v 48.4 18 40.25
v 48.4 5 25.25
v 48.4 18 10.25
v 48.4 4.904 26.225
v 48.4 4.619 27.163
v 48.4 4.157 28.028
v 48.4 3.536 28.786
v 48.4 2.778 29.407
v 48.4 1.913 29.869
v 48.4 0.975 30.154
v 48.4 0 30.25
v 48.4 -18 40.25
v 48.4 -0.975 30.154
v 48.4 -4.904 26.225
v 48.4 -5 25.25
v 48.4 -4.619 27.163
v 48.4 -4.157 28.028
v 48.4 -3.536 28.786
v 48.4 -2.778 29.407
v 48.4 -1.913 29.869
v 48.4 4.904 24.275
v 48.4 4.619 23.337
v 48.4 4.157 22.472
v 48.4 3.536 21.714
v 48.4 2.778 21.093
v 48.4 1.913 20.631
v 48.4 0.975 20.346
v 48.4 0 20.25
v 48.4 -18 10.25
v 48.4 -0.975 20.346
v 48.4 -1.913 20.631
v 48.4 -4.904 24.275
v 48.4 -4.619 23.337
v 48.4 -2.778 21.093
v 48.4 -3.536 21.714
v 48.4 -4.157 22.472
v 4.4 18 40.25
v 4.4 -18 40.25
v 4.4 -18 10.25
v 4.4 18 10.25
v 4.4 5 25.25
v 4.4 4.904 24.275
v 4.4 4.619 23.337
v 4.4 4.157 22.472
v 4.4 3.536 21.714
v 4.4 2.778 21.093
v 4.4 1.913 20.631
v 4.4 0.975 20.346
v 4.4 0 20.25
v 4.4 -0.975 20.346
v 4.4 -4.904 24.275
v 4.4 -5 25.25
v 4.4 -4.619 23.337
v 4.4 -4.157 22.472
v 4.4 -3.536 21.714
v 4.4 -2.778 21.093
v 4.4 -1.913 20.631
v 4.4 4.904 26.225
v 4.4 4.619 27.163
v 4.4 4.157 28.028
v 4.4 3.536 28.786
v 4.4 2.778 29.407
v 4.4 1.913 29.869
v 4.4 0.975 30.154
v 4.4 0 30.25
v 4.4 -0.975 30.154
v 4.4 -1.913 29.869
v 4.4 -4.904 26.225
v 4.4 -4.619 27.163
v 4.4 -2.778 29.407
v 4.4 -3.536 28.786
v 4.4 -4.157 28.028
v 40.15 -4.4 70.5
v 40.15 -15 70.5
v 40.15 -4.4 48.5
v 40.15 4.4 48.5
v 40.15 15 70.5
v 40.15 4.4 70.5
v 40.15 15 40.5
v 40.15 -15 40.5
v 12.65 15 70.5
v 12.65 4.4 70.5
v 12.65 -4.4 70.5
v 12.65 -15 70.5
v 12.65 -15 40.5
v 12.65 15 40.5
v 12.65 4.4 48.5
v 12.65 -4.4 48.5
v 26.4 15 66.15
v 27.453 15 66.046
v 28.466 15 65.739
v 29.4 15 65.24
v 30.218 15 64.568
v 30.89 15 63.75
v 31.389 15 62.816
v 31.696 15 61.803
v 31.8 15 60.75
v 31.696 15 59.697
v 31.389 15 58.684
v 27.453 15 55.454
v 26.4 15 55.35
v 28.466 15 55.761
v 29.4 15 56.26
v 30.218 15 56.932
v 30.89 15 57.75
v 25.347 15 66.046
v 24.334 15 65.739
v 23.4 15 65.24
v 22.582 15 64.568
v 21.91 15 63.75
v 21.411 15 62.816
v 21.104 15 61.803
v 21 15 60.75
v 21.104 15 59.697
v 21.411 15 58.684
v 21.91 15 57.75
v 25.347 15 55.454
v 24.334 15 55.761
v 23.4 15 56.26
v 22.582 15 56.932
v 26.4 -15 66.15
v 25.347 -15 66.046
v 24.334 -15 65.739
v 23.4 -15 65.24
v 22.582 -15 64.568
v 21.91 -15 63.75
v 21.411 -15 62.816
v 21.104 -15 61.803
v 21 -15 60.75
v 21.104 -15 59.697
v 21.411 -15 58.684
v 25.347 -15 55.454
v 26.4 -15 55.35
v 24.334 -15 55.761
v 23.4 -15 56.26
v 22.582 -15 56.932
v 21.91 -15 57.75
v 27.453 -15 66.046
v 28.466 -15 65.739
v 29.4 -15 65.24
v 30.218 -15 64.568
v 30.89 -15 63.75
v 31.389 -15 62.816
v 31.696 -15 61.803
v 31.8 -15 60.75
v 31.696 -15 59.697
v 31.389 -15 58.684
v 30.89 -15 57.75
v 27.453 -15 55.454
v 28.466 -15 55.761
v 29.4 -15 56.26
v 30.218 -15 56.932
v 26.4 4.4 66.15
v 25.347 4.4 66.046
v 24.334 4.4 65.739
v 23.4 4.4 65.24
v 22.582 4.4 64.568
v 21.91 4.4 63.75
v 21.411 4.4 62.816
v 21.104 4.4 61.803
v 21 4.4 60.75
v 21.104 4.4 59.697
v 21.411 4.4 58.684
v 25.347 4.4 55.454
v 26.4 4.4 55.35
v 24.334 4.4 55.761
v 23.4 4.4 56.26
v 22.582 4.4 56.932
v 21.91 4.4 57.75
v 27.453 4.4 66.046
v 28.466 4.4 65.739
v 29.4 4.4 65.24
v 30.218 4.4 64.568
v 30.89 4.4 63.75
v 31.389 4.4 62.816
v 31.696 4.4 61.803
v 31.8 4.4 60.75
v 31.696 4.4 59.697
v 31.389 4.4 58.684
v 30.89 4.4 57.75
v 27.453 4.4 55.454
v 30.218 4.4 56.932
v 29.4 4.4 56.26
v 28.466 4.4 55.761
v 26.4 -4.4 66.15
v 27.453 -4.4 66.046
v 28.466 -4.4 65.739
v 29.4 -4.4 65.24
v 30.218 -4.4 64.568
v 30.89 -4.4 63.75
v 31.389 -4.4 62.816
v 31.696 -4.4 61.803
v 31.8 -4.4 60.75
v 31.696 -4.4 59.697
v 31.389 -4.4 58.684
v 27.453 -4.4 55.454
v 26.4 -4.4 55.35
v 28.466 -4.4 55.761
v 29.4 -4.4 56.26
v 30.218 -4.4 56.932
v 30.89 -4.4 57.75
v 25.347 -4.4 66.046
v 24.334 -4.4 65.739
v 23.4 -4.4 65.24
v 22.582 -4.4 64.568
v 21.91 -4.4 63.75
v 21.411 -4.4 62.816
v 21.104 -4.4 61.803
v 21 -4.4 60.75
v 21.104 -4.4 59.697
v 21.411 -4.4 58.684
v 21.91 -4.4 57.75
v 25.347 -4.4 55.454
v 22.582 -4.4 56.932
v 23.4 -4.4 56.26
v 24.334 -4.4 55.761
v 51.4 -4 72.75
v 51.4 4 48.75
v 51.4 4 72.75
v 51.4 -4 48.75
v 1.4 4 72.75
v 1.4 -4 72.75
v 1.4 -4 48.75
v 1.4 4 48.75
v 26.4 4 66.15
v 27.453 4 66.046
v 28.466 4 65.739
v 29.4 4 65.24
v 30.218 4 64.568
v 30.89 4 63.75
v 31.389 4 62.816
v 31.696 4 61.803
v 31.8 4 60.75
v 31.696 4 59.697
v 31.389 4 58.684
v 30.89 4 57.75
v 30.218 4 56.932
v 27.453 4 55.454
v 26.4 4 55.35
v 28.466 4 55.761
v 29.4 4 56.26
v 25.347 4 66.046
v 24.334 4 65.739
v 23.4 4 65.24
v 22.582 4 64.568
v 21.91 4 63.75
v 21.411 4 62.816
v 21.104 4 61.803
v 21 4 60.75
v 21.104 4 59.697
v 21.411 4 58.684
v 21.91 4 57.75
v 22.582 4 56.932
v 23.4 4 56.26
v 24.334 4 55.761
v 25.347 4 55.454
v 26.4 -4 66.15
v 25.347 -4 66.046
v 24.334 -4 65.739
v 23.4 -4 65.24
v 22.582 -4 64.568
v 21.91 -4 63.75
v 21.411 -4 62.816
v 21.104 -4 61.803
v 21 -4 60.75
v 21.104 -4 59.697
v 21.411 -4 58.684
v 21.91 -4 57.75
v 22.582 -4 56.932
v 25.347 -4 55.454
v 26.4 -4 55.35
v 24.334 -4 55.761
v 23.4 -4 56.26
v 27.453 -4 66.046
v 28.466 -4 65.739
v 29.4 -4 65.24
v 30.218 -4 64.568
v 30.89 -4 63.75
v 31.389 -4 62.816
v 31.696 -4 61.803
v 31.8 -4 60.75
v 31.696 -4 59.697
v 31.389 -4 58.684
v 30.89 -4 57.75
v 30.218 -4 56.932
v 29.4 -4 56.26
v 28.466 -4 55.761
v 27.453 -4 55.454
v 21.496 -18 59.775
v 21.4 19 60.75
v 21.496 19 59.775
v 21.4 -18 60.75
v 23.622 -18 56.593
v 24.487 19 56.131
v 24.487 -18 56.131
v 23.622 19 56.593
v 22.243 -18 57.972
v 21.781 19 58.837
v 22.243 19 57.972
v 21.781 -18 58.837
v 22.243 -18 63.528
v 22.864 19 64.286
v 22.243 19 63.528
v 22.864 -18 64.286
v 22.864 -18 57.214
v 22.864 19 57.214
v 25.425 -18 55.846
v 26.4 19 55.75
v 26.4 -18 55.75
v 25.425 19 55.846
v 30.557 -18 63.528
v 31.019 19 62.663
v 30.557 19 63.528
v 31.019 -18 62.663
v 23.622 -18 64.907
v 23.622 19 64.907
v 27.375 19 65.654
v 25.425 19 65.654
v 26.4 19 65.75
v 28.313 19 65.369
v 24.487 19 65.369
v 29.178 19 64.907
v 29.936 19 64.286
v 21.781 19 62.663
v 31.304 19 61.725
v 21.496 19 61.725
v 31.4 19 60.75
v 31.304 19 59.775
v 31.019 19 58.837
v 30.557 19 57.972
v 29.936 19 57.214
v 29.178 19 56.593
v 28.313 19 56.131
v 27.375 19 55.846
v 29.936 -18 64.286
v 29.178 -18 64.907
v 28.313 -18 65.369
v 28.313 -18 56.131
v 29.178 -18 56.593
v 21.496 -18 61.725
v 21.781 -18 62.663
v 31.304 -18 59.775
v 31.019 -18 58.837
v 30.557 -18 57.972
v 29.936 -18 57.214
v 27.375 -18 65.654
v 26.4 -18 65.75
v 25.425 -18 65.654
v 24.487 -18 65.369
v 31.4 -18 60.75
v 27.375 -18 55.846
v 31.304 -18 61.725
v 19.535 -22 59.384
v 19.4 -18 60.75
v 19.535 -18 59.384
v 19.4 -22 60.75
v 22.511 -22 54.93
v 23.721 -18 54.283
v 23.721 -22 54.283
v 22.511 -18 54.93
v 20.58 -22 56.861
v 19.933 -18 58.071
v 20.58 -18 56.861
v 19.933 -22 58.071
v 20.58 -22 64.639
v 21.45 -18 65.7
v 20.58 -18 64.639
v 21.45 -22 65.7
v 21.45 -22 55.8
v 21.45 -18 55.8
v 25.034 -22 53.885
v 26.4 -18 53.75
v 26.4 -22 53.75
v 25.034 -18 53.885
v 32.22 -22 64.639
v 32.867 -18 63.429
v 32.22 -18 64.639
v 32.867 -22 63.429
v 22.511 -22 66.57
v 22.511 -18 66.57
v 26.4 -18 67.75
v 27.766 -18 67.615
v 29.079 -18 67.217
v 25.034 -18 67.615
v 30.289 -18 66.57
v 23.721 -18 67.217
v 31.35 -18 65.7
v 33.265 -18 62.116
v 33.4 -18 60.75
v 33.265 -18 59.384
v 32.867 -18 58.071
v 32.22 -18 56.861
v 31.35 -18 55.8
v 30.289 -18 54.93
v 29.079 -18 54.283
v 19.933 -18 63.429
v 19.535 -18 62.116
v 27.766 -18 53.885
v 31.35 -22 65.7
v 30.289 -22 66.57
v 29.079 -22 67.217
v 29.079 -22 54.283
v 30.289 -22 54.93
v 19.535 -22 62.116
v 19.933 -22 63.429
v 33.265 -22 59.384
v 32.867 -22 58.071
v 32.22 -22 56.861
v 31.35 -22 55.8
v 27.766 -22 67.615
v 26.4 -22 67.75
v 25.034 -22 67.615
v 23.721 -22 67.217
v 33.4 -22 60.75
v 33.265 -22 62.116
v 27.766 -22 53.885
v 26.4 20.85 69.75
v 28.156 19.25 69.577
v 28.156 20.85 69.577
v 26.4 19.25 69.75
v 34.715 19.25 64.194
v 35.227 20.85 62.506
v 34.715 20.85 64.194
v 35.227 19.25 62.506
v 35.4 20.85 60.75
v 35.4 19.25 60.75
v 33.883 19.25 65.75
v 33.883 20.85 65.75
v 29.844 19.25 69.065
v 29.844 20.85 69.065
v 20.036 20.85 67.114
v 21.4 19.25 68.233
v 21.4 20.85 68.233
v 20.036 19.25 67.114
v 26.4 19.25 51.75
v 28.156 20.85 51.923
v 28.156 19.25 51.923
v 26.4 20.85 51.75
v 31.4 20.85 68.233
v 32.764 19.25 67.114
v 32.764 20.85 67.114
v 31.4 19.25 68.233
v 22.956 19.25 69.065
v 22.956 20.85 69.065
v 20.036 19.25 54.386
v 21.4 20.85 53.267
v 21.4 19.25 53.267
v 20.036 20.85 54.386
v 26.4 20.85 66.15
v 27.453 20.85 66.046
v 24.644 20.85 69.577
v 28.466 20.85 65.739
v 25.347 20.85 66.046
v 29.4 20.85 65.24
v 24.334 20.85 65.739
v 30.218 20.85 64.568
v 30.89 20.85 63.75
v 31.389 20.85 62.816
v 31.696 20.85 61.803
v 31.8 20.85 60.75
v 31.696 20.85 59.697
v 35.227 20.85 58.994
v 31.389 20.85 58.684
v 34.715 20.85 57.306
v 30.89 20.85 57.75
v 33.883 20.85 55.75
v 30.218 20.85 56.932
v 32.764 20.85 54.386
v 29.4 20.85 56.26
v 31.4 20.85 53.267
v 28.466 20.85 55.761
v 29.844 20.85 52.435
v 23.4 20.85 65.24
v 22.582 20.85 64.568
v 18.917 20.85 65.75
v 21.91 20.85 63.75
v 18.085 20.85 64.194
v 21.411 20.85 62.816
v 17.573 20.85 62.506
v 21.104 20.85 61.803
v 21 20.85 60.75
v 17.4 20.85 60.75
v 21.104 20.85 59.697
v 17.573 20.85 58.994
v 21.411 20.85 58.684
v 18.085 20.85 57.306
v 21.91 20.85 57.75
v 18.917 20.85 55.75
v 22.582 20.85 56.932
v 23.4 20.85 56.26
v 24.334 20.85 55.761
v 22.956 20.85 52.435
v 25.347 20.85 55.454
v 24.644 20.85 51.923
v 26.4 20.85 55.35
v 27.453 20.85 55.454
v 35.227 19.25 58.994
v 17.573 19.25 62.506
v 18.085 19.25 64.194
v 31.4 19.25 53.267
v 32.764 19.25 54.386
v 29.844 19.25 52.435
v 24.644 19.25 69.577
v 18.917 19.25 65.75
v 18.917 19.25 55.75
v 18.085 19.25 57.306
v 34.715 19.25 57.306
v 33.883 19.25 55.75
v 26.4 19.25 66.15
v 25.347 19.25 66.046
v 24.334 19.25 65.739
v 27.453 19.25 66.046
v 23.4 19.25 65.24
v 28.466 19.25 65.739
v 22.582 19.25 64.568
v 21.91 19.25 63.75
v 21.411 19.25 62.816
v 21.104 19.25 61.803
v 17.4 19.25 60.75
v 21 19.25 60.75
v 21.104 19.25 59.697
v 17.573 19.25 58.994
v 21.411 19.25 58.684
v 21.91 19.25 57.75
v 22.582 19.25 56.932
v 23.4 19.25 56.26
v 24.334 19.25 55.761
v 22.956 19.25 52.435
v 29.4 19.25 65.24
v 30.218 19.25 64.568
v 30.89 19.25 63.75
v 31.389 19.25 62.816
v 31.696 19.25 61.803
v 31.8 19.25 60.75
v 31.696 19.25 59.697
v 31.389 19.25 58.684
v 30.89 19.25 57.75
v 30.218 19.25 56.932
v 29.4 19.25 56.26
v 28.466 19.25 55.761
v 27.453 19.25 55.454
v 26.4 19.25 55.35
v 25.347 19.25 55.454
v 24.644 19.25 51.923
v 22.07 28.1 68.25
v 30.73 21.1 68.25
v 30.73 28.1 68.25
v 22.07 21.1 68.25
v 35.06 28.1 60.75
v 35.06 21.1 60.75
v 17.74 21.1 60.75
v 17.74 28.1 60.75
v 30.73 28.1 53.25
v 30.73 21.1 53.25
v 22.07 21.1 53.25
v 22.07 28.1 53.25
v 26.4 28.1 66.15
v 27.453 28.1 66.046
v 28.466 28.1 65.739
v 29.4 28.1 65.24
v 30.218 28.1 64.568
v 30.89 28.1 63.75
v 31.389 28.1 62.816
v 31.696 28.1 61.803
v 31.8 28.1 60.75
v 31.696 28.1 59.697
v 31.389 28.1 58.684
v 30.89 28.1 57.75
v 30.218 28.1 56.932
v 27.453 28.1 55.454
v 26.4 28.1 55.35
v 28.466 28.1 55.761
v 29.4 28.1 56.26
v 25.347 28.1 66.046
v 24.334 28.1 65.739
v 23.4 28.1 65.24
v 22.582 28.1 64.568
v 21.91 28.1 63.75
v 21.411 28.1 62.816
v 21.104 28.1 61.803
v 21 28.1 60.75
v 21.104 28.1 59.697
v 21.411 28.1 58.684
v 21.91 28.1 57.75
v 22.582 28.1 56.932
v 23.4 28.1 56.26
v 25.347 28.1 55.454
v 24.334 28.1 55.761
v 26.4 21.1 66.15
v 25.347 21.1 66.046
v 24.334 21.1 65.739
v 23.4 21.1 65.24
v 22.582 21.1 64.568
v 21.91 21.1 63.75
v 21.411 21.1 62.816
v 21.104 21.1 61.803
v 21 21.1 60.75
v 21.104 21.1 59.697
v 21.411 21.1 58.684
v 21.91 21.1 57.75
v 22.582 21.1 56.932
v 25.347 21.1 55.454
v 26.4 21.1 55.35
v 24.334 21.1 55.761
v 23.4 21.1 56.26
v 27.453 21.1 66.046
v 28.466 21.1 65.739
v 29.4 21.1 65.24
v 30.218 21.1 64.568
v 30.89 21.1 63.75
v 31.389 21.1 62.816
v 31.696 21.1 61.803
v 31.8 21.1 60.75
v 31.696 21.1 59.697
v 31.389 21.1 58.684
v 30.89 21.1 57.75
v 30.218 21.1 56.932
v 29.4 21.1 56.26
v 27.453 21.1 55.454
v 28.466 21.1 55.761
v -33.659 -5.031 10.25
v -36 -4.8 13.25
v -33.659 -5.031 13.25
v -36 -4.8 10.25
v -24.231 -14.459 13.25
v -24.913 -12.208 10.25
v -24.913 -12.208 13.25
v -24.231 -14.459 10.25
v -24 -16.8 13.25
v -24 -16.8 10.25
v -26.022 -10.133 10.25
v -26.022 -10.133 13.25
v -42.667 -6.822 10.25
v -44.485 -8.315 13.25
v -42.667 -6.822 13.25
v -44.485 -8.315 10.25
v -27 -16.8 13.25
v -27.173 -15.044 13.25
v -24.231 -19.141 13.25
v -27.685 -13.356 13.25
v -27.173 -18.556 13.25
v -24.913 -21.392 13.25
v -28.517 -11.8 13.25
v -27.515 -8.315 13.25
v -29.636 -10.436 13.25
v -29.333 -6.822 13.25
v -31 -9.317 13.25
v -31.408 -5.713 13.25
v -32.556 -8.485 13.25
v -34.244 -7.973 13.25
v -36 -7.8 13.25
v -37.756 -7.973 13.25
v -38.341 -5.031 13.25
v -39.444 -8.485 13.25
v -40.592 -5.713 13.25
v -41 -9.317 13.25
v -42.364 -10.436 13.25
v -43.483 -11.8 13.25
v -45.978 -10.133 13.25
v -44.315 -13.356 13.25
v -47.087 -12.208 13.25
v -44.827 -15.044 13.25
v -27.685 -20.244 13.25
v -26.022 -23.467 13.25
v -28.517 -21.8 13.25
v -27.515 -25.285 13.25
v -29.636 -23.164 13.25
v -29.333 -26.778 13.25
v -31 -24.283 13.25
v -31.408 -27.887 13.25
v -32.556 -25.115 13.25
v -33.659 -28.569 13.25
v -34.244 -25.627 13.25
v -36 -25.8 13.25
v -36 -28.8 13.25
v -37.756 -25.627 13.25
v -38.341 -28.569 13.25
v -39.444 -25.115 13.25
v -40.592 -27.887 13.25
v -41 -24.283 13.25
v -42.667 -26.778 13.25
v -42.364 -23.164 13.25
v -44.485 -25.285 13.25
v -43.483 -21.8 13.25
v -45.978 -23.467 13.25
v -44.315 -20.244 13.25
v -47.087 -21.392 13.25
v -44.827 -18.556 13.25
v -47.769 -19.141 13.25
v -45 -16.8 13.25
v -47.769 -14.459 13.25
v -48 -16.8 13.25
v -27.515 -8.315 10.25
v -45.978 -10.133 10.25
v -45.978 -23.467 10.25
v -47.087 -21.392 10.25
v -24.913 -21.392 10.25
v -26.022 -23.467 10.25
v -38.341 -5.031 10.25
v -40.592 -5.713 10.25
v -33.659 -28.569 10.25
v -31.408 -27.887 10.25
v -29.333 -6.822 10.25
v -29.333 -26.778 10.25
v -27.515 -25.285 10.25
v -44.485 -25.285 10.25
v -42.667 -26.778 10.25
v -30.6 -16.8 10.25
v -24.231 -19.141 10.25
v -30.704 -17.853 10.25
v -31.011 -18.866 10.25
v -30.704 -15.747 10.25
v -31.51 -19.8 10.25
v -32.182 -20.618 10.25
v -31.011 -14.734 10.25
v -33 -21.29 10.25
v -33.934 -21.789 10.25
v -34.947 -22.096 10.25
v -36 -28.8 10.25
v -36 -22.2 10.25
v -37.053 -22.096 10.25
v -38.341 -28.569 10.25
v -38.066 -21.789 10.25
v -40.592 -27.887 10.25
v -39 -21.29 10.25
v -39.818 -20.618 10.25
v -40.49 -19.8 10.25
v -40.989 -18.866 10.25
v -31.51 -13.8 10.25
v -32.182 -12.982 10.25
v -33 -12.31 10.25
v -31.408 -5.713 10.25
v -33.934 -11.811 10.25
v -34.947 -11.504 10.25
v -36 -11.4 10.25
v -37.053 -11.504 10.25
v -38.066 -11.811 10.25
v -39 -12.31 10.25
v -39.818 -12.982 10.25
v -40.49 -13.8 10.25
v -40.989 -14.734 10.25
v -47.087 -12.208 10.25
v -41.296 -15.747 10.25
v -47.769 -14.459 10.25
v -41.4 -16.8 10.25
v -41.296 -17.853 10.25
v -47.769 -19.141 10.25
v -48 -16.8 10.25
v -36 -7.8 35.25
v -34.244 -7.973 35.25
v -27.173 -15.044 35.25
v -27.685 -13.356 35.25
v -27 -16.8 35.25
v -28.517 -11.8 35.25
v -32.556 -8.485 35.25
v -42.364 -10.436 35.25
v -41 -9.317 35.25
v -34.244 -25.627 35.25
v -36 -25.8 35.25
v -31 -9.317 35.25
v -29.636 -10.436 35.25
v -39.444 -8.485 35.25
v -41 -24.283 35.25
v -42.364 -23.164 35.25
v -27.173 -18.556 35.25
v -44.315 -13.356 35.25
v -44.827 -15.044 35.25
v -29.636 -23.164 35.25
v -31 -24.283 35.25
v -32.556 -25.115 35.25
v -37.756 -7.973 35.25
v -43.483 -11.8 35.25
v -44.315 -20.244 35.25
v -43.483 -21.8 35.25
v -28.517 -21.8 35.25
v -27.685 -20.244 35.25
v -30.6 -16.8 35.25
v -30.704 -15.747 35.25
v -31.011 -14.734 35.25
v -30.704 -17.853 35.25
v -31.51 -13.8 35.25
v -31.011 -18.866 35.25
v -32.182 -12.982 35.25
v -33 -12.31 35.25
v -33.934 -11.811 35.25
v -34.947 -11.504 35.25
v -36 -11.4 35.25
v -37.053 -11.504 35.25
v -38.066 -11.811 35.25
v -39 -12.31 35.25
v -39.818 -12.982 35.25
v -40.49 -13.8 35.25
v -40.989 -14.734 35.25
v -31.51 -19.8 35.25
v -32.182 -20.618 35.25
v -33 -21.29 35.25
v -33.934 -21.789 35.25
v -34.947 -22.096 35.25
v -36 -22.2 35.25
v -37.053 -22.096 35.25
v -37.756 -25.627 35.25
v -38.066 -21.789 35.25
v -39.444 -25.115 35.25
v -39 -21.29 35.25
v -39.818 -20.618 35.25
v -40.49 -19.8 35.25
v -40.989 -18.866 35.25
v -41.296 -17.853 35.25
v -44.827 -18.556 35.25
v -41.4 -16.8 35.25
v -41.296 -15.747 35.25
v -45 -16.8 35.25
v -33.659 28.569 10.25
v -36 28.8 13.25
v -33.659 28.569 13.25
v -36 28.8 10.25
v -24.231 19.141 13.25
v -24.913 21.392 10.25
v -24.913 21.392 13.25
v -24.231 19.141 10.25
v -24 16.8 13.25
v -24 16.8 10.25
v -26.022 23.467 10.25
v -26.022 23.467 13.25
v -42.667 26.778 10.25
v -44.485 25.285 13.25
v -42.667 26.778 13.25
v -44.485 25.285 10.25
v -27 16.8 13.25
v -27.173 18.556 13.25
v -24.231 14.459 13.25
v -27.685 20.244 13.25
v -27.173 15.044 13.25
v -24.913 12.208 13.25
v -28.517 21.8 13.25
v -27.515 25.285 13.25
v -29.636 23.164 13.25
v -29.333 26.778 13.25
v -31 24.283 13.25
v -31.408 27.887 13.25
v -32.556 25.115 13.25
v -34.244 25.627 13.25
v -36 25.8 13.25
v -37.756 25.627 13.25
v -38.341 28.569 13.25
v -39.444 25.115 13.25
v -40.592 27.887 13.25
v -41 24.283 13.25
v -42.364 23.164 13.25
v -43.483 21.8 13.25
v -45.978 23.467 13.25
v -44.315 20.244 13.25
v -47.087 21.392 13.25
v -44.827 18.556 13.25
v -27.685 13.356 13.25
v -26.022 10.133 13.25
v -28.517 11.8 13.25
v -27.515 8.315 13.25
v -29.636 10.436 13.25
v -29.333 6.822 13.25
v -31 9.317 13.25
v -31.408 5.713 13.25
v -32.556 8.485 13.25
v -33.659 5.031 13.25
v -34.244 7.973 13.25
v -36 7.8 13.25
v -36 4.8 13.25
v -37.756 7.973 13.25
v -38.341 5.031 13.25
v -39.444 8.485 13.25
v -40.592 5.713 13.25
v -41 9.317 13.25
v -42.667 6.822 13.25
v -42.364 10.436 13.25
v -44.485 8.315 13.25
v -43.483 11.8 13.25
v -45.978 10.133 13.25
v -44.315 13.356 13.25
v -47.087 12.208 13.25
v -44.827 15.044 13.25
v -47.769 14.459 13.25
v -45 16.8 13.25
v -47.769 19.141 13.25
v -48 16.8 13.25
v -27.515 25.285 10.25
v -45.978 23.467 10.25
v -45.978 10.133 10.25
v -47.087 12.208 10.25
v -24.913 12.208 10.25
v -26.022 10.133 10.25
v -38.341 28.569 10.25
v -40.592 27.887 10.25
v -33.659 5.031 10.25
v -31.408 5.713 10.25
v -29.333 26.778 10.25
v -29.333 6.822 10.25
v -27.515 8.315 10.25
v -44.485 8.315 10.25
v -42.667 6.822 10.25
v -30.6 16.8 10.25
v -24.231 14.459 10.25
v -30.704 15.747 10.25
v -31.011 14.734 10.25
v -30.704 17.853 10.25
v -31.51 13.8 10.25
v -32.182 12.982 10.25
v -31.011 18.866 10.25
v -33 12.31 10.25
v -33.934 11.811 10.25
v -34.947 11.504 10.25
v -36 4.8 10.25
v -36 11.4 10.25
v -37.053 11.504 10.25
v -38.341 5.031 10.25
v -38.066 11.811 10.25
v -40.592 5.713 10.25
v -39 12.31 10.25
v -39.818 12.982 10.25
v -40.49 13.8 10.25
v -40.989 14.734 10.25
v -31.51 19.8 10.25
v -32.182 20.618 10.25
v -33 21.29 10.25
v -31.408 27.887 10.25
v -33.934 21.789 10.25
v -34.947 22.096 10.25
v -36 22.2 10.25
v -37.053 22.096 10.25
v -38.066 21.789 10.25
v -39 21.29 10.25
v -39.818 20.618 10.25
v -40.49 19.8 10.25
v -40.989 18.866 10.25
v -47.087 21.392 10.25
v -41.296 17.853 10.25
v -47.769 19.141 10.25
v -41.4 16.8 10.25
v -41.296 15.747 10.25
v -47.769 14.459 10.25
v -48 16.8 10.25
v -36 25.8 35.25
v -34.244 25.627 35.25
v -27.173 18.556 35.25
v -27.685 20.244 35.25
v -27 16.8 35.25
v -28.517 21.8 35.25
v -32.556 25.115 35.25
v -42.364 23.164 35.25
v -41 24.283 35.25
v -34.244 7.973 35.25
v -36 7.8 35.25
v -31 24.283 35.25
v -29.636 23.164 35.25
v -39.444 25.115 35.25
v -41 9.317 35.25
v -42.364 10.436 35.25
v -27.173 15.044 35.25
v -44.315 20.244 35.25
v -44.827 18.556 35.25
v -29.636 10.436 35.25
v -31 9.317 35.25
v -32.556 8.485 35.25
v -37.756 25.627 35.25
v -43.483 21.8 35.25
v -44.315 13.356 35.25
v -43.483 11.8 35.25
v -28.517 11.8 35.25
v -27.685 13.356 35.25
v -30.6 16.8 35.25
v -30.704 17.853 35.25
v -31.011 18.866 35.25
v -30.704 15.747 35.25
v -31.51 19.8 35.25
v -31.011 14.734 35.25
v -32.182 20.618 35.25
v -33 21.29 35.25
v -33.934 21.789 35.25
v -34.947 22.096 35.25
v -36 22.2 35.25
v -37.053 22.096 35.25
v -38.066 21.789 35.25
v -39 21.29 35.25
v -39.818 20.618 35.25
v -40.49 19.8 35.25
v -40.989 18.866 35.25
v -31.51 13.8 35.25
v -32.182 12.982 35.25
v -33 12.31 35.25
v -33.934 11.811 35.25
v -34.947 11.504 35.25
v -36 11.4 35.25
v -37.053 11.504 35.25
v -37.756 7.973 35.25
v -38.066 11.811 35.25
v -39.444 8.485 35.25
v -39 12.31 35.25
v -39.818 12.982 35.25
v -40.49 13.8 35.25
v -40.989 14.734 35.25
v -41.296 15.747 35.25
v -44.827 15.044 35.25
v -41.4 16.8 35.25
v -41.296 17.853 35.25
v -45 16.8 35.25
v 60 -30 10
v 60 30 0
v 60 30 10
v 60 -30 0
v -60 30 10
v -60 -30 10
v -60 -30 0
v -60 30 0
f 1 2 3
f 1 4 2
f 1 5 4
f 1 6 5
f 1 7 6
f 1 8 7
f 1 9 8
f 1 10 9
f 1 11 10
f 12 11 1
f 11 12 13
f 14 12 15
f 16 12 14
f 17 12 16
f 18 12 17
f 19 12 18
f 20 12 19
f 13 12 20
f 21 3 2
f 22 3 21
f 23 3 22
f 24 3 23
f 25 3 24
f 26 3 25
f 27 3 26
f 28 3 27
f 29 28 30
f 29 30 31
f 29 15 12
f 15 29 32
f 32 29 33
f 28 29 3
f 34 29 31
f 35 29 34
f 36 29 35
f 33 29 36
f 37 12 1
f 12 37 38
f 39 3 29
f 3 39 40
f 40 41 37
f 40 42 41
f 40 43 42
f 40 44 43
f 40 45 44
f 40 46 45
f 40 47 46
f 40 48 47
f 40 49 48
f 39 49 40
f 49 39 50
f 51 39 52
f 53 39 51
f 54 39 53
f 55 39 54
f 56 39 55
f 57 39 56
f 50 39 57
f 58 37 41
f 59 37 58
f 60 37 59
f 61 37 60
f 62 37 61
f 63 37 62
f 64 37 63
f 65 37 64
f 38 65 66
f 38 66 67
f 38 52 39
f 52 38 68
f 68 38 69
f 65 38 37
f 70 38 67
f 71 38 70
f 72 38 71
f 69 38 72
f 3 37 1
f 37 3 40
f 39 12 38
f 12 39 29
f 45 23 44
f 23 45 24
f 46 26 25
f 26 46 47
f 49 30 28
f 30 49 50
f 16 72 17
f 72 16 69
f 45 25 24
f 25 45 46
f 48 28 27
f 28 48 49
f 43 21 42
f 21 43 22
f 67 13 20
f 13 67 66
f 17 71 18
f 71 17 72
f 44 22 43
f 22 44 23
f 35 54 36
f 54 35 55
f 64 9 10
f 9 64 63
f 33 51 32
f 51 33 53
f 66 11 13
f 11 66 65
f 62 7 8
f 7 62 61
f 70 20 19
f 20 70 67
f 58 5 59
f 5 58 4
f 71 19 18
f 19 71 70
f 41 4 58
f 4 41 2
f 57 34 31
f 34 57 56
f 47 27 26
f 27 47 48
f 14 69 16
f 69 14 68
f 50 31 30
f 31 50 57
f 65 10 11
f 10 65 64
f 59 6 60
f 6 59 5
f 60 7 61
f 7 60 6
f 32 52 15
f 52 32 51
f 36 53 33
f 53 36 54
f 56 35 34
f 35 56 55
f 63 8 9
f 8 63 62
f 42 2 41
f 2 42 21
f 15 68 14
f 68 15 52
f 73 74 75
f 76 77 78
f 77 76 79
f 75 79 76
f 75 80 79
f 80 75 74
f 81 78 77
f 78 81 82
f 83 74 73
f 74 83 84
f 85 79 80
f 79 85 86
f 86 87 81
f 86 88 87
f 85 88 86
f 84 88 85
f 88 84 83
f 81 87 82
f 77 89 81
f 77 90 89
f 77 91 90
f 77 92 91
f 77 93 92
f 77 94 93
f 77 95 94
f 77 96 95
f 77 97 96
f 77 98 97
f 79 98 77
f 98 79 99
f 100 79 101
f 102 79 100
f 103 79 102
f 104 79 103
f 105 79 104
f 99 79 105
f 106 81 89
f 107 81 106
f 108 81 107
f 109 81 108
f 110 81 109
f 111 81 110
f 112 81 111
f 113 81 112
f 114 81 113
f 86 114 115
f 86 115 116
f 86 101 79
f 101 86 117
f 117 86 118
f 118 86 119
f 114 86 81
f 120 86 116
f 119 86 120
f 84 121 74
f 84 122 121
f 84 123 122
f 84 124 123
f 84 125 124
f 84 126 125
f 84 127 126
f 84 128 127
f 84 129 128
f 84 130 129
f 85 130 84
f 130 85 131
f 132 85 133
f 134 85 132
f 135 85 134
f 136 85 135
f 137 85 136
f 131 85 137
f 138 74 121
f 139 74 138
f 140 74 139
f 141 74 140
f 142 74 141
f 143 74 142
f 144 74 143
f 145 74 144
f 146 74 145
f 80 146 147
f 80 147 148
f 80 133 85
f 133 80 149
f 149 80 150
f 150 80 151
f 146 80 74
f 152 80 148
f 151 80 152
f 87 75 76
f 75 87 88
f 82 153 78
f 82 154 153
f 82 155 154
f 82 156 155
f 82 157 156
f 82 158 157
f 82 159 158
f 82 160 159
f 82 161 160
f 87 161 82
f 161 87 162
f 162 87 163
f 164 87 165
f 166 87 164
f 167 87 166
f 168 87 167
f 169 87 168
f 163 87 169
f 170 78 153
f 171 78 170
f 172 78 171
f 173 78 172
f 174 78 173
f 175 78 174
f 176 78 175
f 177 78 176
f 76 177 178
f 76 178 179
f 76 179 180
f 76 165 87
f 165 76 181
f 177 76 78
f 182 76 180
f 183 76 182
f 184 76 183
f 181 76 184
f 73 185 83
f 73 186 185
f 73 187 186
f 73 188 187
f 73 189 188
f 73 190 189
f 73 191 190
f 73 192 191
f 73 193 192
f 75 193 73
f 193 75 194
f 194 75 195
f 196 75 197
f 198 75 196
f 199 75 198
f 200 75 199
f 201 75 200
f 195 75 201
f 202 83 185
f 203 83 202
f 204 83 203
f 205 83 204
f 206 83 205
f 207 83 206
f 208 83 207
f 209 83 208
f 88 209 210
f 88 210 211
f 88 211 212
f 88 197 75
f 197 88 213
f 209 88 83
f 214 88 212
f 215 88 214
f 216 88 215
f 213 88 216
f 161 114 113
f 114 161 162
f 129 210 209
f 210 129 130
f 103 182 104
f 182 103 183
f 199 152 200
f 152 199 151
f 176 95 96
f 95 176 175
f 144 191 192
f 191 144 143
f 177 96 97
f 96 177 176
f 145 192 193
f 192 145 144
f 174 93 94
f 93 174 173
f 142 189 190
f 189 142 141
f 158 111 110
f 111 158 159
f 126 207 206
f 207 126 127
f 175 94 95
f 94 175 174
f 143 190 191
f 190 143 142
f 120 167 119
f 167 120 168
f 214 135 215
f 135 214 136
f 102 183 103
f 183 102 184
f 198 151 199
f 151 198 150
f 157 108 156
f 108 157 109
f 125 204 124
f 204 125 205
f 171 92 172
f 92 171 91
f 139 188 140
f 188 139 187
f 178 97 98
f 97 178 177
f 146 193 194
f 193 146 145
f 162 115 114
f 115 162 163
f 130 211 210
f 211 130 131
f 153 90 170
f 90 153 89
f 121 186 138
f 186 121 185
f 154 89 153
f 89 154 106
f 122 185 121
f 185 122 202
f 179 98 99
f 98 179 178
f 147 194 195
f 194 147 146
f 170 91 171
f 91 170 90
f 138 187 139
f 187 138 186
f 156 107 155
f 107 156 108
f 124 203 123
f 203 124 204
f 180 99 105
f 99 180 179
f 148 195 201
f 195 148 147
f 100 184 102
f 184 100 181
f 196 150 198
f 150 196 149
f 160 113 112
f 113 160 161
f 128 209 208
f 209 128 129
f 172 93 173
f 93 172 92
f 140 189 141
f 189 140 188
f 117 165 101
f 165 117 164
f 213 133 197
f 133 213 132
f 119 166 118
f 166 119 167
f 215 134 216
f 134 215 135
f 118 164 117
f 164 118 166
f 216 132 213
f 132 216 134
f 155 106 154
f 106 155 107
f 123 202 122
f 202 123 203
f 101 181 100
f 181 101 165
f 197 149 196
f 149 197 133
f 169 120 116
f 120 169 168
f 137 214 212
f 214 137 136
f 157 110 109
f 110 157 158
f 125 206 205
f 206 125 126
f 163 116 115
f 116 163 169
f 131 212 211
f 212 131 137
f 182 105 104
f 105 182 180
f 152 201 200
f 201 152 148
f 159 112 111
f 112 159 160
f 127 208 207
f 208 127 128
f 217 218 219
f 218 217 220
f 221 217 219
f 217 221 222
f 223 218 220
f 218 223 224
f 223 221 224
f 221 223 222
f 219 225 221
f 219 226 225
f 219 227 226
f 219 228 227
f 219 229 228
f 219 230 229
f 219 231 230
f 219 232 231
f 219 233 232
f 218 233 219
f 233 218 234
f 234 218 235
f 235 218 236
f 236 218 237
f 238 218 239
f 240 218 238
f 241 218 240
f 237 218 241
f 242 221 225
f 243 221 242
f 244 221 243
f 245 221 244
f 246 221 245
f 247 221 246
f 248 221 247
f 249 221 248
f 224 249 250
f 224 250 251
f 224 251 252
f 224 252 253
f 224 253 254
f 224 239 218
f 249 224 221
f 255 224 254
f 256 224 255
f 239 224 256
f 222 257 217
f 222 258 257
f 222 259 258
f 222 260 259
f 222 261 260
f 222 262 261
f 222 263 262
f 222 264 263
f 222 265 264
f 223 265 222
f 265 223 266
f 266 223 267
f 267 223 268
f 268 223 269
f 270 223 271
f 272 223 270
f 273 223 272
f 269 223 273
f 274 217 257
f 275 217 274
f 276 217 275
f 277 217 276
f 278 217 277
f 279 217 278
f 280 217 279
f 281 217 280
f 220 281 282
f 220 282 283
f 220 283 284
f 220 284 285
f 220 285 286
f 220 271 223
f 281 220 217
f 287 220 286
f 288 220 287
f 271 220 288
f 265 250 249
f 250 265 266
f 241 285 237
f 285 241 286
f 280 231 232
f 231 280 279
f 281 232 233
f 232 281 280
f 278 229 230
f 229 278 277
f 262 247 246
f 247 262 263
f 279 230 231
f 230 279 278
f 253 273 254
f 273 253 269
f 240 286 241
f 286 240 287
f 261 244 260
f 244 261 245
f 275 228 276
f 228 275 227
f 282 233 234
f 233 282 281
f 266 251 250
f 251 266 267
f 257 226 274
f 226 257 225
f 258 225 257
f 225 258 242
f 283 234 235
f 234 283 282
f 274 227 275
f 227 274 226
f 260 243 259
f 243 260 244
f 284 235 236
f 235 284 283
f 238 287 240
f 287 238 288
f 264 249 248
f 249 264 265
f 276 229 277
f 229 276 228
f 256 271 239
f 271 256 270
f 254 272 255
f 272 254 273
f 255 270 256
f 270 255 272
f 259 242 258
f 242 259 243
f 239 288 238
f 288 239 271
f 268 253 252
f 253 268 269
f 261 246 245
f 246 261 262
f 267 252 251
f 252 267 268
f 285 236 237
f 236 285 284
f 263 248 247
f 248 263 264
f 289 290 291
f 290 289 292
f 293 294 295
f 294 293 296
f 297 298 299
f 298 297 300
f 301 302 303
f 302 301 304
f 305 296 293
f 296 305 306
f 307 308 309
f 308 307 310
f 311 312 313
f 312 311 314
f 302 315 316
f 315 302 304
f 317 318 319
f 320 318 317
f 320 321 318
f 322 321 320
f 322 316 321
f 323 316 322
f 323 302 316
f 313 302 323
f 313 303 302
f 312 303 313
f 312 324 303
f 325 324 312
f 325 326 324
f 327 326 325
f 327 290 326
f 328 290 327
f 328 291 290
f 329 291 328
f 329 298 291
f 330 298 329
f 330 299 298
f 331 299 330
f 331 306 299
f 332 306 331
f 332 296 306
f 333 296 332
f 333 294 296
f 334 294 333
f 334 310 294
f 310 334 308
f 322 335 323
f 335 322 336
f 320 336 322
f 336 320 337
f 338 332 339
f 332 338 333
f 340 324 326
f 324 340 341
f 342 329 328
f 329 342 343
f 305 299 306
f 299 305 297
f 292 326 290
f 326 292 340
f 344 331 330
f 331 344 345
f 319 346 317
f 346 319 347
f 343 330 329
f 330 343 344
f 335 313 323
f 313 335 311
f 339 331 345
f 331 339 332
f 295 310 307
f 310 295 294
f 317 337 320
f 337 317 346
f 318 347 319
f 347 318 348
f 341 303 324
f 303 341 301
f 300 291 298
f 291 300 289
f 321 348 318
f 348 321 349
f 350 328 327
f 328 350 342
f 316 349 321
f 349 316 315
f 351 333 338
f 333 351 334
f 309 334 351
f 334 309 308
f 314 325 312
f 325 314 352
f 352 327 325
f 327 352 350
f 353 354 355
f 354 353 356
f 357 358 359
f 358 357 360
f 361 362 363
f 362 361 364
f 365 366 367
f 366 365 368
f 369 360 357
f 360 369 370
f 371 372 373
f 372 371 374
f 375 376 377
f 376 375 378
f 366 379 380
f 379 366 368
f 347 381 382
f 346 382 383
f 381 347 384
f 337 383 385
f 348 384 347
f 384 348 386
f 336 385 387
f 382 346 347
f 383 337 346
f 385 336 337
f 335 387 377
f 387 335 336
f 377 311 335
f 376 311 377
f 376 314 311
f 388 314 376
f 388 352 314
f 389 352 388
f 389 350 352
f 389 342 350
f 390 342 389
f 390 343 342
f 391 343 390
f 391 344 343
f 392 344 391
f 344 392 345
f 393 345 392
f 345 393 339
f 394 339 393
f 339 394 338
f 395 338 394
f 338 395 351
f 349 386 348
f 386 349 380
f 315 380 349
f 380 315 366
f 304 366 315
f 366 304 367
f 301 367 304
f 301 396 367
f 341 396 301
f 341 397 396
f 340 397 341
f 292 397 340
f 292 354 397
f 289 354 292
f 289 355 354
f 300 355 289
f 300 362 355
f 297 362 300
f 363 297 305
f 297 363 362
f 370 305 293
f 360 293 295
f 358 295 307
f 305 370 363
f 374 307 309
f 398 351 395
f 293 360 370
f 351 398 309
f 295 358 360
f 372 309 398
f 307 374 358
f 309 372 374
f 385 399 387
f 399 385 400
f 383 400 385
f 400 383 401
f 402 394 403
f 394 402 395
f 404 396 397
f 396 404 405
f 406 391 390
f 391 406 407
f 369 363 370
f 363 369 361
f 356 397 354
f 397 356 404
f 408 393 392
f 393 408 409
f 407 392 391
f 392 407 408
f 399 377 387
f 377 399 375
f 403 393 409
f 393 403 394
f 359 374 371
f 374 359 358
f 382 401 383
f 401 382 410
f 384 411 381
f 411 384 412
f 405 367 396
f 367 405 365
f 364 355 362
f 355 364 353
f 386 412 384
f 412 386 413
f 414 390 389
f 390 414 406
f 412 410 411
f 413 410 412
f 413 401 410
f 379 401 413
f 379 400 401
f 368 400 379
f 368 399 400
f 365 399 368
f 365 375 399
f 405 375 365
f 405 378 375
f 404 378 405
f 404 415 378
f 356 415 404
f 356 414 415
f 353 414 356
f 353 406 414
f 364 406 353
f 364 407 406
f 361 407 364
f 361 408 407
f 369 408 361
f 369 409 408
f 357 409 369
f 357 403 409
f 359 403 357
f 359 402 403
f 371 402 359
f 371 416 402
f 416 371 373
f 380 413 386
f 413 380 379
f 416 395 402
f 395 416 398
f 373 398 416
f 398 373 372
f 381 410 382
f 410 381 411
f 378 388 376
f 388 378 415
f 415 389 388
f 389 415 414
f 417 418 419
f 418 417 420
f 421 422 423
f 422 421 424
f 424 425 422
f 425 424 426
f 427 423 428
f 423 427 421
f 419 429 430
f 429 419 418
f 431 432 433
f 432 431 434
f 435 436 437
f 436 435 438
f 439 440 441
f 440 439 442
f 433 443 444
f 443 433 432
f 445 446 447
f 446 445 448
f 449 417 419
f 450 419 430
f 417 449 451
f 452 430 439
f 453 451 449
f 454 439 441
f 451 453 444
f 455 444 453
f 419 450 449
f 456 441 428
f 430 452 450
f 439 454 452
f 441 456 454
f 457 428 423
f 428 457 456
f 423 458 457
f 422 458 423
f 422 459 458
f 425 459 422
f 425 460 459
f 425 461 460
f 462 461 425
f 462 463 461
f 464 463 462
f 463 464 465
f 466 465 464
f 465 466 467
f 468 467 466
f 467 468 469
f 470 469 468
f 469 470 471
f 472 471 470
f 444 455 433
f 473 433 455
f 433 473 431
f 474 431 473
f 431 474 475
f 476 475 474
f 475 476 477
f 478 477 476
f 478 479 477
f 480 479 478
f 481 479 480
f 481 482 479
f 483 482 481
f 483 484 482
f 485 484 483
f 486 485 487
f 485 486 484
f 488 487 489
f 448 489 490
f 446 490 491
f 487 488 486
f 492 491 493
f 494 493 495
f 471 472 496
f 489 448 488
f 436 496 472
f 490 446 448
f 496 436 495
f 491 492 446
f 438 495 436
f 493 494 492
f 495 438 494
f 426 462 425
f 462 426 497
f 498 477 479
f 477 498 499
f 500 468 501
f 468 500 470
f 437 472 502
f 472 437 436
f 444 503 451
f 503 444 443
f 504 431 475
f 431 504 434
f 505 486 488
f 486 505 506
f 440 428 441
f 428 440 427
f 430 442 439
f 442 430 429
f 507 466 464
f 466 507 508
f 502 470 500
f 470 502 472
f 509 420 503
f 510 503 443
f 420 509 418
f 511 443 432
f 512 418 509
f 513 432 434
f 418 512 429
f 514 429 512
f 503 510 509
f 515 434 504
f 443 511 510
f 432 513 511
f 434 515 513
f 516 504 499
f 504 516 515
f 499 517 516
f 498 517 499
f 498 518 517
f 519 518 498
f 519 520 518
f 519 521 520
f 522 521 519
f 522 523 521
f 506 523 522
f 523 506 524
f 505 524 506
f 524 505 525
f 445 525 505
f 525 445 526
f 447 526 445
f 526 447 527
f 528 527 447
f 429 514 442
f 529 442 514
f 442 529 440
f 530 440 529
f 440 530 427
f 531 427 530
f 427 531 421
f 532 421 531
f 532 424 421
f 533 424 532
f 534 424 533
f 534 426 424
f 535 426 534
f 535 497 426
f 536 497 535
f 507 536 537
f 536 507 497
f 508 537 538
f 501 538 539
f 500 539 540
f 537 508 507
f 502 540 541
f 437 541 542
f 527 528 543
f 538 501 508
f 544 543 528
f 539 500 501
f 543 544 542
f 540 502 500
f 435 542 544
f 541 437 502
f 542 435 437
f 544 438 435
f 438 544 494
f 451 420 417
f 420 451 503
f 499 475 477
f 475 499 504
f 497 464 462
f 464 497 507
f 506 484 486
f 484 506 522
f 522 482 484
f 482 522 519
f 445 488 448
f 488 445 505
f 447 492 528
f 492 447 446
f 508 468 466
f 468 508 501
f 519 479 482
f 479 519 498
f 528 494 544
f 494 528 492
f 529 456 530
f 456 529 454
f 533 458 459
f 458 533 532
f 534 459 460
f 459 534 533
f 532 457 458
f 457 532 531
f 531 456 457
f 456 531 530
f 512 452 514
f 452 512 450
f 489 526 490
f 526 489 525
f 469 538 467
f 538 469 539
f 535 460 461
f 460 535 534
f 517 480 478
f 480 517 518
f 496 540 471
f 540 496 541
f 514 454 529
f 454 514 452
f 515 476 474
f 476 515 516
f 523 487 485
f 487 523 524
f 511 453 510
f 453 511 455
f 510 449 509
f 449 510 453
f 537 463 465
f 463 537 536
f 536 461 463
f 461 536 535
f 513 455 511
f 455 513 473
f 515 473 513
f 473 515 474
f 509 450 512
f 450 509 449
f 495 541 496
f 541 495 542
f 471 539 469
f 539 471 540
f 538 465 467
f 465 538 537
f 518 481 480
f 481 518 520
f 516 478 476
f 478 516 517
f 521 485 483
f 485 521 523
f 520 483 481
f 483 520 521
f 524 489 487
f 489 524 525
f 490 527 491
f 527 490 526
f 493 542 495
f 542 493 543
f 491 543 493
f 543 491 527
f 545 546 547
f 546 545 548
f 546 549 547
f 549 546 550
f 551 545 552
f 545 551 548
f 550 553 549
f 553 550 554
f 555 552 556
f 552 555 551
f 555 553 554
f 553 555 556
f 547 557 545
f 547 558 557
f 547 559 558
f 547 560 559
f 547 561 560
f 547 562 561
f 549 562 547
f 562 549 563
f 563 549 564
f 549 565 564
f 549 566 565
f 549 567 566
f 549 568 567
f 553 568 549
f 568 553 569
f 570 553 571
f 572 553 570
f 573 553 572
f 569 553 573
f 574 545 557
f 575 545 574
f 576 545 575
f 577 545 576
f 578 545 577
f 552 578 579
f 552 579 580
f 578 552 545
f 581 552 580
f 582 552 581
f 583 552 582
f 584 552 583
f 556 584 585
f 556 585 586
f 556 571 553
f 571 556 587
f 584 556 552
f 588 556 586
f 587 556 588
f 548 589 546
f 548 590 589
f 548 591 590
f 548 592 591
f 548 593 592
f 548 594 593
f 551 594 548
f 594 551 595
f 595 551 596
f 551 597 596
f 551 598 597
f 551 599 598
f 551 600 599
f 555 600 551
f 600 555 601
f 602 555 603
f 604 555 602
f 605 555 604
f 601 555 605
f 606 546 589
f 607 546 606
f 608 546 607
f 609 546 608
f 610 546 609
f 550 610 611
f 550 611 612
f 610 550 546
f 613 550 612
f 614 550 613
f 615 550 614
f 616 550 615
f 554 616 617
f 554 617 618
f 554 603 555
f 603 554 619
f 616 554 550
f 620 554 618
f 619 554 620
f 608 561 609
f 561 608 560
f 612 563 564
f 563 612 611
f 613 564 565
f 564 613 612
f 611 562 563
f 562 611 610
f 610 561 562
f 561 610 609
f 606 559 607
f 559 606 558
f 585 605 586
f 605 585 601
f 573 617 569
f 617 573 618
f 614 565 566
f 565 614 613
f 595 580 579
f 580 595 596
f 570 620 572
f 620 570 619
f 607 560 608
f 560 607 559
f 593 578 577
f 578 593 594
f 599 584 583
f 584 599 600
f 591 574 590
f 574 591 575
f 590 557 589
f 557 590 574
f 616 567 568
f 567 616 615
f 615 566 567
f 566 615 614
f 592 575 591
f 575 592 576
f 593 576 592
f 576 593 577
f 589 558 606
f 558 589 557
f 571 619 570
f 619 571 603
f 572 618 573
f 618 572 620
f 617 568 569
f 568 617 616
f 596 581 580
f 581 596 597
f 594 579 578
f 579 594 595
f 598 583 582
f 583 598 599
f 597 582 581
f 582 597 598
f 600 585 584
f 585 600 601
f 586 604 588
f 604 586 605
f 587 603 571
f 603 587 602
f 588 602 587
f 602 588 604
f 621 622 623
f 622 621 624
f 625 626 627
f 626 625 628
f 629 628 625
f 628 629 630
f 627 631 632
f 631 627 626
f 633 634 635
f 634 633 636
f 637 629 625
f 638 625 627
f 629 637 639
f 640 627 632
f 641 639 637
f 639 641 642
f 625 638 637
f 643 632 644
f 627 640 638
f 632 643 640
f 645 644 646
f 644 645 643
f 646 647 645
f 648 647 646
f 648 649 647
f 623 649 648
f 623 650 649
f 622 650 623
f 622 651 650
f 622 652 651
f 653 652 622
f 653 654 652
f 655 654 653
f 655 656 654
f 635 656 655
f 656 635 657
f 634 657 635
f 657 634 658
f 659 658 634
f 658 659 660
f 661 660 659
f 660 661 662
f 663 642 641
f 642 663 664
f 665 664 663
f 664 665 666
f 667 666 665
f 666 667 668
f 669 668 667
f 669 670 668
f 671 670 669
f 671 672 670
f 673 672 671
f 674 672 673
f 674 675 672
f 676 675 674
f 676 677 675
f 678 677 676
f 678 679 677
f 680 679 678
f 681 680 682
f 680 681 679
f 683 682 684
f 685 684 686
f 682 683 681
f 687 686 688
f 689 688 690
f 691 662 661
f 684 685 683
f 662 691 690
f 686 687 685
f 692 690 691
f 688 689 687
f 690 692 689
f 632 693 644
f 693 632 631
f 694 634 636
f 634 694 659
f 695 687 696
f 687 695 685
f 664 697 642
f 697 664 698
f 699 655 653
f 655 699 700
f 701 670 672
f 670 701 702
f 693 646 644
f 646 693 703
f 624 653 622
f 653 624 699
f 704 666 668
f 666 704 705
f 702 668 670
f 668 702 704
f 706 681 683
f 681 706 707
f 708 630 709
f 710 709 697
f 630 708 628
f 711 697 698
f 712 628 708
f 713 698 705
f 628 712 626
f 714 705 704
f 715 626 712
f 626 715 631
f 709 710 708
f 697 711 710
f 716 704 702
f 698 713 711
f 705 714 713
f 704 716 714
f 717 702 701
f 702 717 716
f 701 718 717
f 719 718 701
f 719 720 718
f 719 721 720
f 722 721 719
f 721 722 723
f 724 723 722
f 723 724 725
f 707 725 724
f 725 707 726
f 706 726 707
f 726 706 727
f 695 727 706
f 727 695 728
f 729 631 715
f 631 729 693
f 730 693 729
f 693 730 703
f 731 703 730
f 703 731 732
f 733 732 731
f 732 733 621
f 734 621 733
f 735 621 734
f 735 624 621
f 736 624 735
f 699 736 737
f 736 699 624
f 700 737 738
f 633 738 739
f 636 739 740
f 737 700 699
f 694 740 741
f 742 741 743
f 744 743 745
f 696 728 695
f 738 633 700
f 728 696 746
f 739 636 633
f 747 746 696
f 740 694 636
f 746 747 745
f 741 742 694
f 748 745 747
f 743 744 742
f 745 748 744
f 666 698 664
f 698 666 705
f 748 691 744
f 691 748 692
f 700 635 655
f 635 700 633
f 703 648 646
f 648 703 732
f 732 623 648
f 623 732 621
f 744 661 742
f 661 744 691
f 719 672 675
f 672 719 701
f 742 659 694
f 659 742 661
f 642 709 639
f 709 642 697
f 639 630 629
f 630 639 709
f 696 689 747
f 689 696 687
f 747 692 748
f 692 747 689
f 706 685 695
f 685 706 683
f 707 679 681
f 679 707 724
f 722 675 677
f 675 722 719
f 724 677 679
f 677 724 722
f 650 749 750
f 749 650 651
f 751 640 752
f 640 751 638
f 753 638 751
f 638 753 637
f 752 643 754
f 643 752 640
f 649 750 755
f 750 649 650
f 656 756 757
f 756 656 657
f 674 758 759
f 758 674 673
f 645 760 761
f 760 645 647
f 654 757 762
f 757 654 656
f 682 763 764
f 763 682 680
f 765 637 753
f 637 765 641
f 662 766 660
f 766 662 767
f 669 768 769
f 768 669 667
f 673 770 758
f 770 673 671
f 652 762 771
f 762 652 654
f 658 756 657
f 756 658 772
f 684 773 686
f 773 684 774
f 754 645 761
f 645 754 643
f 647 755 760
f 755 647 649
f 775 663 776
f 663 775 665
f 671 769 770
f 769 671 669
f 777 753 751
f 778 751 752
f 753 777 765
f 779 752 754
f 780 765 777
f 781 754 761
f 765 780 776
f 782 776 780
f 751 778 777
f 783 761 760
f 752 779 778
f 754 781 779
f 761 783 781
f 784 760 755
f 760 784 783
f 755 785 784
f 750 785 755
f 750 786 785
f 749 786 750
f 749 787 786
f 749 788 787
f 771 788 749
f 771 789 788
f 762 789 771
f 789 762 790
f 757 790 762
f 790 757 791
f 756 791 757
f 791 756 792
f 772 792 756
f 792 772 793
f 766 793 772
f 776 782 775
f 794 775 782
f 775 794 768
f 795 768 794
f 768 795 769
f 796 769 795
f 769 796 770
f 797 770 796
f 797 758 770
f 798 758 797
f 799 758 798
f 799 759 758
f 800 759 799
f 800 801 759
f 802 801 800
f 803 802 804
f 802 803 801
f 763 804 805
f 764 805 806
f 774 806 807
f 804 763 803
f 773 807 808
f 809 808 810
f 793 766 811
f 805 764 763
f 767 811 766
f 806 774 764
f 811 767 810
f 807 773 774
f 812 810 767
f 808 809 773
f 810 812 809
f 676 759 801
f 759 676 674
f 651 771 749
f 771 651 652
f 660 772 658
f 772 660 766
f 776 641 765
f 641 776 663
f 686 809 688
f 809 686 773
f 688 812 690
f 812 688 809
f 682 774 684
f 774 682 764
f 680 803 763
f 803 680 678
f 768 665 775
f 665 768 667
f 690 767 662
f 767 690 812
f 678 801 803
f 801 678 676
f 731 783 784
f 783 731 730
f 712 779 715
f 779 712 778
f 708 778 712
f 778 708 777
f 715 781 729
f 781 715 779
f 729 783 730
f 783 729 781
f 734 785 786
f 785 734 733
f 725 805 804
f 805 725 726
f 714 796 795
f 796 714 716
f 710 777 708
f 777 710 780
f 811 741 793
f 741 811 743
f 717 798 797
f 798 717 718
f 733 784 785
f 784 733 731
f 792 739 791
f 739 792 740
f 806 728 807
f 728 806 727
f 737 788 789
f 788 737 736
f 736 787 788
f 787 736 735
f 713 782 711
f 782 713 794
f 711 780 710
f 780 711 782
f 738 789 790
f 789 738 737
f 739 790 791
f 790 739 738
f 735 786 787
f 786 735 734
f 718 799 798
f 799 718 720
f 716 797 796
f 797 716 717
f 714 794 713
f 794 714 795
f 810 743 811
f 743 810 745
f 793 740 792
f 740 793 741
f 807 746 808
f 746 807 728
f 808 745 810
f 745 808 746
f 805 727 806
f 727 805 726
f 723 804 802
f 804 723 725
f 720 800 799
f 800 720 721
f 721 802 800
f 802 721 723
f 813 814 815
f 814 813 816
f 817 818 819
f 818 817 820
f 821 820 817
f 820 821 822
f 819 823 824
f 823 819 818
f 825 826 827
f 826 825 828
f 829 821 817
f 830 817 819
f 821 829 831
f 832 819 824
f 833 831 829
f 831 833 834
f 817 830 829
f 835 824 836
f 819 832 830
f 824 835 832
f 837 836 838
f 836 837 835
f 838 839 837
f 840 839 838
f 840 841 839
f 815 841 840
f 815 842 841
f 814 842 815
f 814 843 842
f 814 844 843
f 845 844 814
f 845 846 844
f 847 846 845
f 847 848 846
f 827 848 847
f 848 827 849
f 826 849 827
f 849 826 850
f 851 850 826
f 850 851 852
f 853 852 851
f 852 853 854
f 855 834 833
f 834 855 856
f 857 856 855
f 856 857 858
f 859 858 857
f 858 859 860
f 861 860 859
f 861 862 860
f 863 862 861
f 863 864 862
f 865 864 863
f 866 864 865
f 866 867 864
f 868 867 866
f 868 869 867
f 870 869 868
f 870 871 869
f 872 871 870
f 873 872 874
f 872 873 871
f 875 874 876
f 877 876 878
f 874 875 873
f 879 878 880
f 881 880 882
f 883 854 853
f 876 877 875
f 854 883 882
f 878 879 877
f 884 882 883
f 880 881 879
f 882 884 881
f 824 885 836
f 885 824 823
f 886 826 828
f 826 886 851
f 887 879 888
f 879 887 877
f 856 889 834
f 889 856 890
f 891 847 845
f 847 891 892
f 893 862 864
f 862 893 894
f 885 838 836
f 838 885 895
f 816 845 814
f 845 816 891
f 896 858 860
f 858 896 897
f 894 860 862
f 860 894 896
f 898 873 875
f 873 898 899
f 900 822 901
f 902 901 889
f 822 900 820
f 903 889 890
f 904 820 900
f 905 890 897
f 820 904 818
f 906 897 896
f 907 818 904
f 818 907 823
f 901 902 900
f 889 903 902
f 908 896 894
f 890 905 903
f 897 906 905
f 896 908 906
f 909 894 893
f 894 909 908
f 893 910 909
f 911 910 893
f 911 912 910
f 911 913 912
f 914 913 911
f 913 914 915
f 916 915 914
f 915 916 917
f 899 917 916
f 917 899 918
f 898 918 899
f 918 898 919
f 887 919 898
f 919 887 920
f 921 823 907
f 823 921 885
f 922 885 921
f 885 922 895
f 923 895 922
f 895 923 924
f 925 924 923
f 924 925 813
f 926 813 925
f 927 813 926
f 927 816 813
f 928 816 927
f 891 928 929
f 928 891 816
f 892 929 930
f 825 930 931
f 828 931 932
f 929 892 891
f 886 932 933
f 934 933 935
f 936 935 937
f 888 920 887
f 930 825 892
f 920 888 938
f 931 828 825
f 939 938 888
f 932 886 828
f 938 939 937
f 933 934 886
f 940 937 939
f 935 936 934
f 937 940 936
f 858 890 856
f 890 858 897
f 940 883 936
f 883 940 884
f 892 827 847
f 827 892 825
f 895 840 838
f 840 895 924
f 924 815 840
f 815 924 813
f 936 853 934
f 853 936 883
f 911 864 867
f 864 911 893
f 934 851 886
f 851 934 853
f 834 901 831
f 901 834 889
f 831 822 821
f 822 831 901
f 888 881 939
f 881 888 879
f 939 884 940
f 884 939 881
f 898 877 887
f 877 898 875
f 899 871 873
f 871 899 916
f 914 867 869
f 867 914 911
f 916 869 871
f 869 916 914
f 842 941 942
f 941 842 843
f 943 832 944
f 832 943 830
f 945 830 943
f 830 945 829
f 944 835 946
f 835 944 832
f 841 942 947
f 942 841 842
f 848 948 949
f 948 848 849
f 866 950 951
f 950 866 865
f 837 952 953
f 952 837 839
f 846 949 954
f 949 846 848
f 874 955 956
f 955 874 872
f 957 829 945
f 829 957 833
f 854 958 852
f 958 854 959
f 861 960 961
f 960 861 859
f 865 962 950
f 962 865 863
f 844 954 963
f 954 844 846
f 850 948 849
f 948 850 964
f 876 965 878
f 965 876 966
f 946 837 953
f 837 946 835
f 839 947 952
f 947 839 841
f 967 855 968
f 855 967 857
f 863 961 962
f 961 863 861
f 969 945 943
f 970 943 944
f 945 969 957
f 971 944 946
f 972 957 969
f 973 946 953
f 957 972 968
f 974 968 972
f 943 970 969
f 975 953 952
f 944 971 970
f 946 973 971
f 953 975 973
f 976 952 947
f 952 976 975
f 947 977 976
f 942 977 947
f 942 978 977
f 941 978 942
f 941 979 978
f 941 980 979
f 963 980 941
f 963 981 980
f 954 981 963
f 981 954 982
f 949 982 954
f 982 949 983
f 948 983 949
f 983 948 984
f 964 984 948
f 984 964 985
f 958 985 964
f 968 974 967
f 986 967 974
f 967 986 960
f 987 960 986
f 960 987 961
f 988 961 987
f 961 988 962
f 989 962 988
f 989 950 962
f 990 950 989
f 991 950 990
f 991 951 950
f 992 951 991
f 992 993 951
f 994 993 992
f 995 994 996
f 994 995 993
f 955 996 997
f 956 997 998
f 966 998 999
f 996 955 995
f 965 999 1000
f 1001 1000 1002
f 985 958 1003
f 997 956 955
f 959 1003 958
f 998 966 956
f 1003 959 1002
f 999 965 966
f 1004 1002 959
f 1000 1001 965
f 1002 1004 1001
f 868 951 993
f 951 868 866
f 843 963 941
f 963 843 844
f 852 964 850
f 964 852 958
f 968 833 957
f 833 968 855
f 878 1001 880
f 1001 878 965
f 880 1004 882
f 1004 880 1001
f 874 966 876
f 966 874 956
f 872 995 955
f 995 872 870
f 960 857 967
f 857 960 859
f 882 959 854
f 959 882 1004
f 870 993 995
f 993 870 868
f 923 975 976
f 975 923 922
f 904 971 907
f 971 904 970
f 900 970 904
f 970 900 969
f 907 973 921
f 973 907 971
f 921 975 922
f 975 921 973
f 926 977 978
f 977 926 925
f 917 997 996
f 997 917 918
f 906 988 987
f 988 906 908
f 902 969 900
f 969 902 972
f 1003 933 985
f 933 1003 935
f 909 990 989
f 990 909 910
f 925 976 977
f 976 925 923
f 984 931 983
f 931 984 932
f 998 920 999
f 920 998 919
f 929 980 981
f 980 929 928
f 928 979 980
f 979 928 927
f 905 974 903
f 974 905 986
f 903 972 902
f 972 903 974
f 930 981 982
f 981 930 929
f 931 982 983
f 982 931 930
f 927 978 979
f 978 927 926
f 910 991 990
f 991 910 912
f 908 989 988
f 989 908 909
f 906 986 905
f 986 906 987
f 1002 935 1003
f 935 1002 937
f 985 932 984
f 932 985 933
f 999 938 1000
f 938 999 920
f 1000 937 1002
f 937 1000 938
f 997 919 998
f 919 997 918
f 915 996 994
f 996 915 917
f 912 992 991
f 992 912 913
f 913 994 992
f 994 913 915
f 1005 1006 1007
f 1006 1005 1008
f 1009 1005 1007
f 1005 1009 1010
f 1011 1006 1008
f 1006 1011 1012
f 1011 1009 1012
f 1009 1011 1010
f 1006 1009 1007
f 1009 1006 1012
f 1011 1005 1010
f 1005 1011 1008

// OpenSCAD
$fn = 32;

// ------------------------------------------------------------------------
// Indexing jig: plate 120 x 60 mm, pin d10
// Every part is its own module, assembly() places every instance.
// ------------------------------------------------------------------------

// --- part 1 ---
module jig_plate() {
  difference() {
    translate([-60, -30, 0]) cube([120, 60, 10]);
  }
}

// --- part 2 ---
module locator_block() {
  difference() {
    translate([-22, -18, 0]) cube([44, 36, 30]);
    translate([0, 0, 15]) rotate([0, 90, 0]) cylinder(h = 46, d = 10, center = true);
  }
}

// --- part 3 ---
module index_fork() {
  difference() {
    translate([-13.75, -15, 0]) cube([27.5, 30, 30]);
    translate([-14.75, -4.4, 8]) cube([29.5, 8.8, 23]);
    translate([0, 0, 20.25]) rotate([90, 0, 0]) cylinder(h = 32, d = 10.8, center = true);
  }
}

// --- part 4 ---
module index_arm() {
  difference() {
    translate([-25, -4, 0]) cube([50, 8, 24]);
    translate([0, 0, 12]) rotate([90, 0, 0]) cylinder(h = 10, d = 10.8, center = true);
  }
}

// --- part 5 ---
module index_pin() {
  rotate([0, 90, 0]) cylinder(h = 38, d = 10, center = true);
  translate([-22, 0, 0]) rotate([0, 90, 0]) cylinder(h = 4, d = 14);
}

// --- part 6 ---
module pin_washer() {
  difference() {
      translate([0, 0, 0]) cylinder(h = 1.6, d = 18);
      translate([0, 0, -1]) cylinder(h = 3.6, d = 10.8);
    }
}

// --- part 7 ---
module lock_nut() {
  difference() {
    linear_extrude(height = 7) polygon(points = [[8.66, 0], [4.33, 7.5], [-4.33, 7.5], [-8.66, 0], [-4.33, -7.5], [4.33, -7.5]]);
    translate([0, 0, -1]) cylinder(h = 9, d = 10.8);
  }
}

// --- part 8 ---
module guide_bush_a() {
  difference() {
    union() {
      cylinder(h = 3, d = 24);
      translate([0, 0, 3]) cylinder(h = 22, d = 18);
    }
    translate([0, 0, -1]) cylinder(h = 27, d = 10.8);
  }
}

// --- part 9 ---
module guide_bush_b() {
  difference() {
    union() {
      cylinder(h = 3, d = 24);
      translate([0, 0, 3]) cylinder(h = 22, d = 18);
    }
    translate([0, 0, -1]) cylinder(h = 27, d = 10.8);
  }
}

// --- assembly ---
module assembly() {
  color([0.80, 0.24, 0.20]) translate([0, 0, 0]) rotate([0, 0, 0]) jig_plate();
  color([0.20, 0.45, 0.75]) translate([26.4, 0, 10.25]) rotate([0, 0, 0]) locator_block();
  color([0.25, 0.62, 0.32]) translate([26.4, 0, 40.5]) rotate([0, 0, 0]) index_fork();
  color([0.92, 0.70, 0.18]) translate([26.4, 0, 48.75]) rotate([0, 0, 0]) index_arm();
  color([0.58, 0.35, 0.70]) translate([26.4, 0, 60.75]) rotate([0, 0, 90]) index_pin();
  color([0.16, 0.66, 0.66]) translate([26.4, 20.85, 60.75]) rotate([90, 0, 0]) pin_washer();
  color([0.85, 0.48, 0.18]) translate([26.4, 28.1, 60.75]) rotate([90, 0, 0]) lock_nut();
  color([0.55, 0.60, 0.65]) translate([-36, -16.8, 10.25]) rotate([0, 0, 0]) guide_bush_a();
  color([0.75, 0.30, 0.55]) translate([-36, 16.8, 10.25]) rotate([0, 0, 0]) guide_bush_b();
}

assembly();
